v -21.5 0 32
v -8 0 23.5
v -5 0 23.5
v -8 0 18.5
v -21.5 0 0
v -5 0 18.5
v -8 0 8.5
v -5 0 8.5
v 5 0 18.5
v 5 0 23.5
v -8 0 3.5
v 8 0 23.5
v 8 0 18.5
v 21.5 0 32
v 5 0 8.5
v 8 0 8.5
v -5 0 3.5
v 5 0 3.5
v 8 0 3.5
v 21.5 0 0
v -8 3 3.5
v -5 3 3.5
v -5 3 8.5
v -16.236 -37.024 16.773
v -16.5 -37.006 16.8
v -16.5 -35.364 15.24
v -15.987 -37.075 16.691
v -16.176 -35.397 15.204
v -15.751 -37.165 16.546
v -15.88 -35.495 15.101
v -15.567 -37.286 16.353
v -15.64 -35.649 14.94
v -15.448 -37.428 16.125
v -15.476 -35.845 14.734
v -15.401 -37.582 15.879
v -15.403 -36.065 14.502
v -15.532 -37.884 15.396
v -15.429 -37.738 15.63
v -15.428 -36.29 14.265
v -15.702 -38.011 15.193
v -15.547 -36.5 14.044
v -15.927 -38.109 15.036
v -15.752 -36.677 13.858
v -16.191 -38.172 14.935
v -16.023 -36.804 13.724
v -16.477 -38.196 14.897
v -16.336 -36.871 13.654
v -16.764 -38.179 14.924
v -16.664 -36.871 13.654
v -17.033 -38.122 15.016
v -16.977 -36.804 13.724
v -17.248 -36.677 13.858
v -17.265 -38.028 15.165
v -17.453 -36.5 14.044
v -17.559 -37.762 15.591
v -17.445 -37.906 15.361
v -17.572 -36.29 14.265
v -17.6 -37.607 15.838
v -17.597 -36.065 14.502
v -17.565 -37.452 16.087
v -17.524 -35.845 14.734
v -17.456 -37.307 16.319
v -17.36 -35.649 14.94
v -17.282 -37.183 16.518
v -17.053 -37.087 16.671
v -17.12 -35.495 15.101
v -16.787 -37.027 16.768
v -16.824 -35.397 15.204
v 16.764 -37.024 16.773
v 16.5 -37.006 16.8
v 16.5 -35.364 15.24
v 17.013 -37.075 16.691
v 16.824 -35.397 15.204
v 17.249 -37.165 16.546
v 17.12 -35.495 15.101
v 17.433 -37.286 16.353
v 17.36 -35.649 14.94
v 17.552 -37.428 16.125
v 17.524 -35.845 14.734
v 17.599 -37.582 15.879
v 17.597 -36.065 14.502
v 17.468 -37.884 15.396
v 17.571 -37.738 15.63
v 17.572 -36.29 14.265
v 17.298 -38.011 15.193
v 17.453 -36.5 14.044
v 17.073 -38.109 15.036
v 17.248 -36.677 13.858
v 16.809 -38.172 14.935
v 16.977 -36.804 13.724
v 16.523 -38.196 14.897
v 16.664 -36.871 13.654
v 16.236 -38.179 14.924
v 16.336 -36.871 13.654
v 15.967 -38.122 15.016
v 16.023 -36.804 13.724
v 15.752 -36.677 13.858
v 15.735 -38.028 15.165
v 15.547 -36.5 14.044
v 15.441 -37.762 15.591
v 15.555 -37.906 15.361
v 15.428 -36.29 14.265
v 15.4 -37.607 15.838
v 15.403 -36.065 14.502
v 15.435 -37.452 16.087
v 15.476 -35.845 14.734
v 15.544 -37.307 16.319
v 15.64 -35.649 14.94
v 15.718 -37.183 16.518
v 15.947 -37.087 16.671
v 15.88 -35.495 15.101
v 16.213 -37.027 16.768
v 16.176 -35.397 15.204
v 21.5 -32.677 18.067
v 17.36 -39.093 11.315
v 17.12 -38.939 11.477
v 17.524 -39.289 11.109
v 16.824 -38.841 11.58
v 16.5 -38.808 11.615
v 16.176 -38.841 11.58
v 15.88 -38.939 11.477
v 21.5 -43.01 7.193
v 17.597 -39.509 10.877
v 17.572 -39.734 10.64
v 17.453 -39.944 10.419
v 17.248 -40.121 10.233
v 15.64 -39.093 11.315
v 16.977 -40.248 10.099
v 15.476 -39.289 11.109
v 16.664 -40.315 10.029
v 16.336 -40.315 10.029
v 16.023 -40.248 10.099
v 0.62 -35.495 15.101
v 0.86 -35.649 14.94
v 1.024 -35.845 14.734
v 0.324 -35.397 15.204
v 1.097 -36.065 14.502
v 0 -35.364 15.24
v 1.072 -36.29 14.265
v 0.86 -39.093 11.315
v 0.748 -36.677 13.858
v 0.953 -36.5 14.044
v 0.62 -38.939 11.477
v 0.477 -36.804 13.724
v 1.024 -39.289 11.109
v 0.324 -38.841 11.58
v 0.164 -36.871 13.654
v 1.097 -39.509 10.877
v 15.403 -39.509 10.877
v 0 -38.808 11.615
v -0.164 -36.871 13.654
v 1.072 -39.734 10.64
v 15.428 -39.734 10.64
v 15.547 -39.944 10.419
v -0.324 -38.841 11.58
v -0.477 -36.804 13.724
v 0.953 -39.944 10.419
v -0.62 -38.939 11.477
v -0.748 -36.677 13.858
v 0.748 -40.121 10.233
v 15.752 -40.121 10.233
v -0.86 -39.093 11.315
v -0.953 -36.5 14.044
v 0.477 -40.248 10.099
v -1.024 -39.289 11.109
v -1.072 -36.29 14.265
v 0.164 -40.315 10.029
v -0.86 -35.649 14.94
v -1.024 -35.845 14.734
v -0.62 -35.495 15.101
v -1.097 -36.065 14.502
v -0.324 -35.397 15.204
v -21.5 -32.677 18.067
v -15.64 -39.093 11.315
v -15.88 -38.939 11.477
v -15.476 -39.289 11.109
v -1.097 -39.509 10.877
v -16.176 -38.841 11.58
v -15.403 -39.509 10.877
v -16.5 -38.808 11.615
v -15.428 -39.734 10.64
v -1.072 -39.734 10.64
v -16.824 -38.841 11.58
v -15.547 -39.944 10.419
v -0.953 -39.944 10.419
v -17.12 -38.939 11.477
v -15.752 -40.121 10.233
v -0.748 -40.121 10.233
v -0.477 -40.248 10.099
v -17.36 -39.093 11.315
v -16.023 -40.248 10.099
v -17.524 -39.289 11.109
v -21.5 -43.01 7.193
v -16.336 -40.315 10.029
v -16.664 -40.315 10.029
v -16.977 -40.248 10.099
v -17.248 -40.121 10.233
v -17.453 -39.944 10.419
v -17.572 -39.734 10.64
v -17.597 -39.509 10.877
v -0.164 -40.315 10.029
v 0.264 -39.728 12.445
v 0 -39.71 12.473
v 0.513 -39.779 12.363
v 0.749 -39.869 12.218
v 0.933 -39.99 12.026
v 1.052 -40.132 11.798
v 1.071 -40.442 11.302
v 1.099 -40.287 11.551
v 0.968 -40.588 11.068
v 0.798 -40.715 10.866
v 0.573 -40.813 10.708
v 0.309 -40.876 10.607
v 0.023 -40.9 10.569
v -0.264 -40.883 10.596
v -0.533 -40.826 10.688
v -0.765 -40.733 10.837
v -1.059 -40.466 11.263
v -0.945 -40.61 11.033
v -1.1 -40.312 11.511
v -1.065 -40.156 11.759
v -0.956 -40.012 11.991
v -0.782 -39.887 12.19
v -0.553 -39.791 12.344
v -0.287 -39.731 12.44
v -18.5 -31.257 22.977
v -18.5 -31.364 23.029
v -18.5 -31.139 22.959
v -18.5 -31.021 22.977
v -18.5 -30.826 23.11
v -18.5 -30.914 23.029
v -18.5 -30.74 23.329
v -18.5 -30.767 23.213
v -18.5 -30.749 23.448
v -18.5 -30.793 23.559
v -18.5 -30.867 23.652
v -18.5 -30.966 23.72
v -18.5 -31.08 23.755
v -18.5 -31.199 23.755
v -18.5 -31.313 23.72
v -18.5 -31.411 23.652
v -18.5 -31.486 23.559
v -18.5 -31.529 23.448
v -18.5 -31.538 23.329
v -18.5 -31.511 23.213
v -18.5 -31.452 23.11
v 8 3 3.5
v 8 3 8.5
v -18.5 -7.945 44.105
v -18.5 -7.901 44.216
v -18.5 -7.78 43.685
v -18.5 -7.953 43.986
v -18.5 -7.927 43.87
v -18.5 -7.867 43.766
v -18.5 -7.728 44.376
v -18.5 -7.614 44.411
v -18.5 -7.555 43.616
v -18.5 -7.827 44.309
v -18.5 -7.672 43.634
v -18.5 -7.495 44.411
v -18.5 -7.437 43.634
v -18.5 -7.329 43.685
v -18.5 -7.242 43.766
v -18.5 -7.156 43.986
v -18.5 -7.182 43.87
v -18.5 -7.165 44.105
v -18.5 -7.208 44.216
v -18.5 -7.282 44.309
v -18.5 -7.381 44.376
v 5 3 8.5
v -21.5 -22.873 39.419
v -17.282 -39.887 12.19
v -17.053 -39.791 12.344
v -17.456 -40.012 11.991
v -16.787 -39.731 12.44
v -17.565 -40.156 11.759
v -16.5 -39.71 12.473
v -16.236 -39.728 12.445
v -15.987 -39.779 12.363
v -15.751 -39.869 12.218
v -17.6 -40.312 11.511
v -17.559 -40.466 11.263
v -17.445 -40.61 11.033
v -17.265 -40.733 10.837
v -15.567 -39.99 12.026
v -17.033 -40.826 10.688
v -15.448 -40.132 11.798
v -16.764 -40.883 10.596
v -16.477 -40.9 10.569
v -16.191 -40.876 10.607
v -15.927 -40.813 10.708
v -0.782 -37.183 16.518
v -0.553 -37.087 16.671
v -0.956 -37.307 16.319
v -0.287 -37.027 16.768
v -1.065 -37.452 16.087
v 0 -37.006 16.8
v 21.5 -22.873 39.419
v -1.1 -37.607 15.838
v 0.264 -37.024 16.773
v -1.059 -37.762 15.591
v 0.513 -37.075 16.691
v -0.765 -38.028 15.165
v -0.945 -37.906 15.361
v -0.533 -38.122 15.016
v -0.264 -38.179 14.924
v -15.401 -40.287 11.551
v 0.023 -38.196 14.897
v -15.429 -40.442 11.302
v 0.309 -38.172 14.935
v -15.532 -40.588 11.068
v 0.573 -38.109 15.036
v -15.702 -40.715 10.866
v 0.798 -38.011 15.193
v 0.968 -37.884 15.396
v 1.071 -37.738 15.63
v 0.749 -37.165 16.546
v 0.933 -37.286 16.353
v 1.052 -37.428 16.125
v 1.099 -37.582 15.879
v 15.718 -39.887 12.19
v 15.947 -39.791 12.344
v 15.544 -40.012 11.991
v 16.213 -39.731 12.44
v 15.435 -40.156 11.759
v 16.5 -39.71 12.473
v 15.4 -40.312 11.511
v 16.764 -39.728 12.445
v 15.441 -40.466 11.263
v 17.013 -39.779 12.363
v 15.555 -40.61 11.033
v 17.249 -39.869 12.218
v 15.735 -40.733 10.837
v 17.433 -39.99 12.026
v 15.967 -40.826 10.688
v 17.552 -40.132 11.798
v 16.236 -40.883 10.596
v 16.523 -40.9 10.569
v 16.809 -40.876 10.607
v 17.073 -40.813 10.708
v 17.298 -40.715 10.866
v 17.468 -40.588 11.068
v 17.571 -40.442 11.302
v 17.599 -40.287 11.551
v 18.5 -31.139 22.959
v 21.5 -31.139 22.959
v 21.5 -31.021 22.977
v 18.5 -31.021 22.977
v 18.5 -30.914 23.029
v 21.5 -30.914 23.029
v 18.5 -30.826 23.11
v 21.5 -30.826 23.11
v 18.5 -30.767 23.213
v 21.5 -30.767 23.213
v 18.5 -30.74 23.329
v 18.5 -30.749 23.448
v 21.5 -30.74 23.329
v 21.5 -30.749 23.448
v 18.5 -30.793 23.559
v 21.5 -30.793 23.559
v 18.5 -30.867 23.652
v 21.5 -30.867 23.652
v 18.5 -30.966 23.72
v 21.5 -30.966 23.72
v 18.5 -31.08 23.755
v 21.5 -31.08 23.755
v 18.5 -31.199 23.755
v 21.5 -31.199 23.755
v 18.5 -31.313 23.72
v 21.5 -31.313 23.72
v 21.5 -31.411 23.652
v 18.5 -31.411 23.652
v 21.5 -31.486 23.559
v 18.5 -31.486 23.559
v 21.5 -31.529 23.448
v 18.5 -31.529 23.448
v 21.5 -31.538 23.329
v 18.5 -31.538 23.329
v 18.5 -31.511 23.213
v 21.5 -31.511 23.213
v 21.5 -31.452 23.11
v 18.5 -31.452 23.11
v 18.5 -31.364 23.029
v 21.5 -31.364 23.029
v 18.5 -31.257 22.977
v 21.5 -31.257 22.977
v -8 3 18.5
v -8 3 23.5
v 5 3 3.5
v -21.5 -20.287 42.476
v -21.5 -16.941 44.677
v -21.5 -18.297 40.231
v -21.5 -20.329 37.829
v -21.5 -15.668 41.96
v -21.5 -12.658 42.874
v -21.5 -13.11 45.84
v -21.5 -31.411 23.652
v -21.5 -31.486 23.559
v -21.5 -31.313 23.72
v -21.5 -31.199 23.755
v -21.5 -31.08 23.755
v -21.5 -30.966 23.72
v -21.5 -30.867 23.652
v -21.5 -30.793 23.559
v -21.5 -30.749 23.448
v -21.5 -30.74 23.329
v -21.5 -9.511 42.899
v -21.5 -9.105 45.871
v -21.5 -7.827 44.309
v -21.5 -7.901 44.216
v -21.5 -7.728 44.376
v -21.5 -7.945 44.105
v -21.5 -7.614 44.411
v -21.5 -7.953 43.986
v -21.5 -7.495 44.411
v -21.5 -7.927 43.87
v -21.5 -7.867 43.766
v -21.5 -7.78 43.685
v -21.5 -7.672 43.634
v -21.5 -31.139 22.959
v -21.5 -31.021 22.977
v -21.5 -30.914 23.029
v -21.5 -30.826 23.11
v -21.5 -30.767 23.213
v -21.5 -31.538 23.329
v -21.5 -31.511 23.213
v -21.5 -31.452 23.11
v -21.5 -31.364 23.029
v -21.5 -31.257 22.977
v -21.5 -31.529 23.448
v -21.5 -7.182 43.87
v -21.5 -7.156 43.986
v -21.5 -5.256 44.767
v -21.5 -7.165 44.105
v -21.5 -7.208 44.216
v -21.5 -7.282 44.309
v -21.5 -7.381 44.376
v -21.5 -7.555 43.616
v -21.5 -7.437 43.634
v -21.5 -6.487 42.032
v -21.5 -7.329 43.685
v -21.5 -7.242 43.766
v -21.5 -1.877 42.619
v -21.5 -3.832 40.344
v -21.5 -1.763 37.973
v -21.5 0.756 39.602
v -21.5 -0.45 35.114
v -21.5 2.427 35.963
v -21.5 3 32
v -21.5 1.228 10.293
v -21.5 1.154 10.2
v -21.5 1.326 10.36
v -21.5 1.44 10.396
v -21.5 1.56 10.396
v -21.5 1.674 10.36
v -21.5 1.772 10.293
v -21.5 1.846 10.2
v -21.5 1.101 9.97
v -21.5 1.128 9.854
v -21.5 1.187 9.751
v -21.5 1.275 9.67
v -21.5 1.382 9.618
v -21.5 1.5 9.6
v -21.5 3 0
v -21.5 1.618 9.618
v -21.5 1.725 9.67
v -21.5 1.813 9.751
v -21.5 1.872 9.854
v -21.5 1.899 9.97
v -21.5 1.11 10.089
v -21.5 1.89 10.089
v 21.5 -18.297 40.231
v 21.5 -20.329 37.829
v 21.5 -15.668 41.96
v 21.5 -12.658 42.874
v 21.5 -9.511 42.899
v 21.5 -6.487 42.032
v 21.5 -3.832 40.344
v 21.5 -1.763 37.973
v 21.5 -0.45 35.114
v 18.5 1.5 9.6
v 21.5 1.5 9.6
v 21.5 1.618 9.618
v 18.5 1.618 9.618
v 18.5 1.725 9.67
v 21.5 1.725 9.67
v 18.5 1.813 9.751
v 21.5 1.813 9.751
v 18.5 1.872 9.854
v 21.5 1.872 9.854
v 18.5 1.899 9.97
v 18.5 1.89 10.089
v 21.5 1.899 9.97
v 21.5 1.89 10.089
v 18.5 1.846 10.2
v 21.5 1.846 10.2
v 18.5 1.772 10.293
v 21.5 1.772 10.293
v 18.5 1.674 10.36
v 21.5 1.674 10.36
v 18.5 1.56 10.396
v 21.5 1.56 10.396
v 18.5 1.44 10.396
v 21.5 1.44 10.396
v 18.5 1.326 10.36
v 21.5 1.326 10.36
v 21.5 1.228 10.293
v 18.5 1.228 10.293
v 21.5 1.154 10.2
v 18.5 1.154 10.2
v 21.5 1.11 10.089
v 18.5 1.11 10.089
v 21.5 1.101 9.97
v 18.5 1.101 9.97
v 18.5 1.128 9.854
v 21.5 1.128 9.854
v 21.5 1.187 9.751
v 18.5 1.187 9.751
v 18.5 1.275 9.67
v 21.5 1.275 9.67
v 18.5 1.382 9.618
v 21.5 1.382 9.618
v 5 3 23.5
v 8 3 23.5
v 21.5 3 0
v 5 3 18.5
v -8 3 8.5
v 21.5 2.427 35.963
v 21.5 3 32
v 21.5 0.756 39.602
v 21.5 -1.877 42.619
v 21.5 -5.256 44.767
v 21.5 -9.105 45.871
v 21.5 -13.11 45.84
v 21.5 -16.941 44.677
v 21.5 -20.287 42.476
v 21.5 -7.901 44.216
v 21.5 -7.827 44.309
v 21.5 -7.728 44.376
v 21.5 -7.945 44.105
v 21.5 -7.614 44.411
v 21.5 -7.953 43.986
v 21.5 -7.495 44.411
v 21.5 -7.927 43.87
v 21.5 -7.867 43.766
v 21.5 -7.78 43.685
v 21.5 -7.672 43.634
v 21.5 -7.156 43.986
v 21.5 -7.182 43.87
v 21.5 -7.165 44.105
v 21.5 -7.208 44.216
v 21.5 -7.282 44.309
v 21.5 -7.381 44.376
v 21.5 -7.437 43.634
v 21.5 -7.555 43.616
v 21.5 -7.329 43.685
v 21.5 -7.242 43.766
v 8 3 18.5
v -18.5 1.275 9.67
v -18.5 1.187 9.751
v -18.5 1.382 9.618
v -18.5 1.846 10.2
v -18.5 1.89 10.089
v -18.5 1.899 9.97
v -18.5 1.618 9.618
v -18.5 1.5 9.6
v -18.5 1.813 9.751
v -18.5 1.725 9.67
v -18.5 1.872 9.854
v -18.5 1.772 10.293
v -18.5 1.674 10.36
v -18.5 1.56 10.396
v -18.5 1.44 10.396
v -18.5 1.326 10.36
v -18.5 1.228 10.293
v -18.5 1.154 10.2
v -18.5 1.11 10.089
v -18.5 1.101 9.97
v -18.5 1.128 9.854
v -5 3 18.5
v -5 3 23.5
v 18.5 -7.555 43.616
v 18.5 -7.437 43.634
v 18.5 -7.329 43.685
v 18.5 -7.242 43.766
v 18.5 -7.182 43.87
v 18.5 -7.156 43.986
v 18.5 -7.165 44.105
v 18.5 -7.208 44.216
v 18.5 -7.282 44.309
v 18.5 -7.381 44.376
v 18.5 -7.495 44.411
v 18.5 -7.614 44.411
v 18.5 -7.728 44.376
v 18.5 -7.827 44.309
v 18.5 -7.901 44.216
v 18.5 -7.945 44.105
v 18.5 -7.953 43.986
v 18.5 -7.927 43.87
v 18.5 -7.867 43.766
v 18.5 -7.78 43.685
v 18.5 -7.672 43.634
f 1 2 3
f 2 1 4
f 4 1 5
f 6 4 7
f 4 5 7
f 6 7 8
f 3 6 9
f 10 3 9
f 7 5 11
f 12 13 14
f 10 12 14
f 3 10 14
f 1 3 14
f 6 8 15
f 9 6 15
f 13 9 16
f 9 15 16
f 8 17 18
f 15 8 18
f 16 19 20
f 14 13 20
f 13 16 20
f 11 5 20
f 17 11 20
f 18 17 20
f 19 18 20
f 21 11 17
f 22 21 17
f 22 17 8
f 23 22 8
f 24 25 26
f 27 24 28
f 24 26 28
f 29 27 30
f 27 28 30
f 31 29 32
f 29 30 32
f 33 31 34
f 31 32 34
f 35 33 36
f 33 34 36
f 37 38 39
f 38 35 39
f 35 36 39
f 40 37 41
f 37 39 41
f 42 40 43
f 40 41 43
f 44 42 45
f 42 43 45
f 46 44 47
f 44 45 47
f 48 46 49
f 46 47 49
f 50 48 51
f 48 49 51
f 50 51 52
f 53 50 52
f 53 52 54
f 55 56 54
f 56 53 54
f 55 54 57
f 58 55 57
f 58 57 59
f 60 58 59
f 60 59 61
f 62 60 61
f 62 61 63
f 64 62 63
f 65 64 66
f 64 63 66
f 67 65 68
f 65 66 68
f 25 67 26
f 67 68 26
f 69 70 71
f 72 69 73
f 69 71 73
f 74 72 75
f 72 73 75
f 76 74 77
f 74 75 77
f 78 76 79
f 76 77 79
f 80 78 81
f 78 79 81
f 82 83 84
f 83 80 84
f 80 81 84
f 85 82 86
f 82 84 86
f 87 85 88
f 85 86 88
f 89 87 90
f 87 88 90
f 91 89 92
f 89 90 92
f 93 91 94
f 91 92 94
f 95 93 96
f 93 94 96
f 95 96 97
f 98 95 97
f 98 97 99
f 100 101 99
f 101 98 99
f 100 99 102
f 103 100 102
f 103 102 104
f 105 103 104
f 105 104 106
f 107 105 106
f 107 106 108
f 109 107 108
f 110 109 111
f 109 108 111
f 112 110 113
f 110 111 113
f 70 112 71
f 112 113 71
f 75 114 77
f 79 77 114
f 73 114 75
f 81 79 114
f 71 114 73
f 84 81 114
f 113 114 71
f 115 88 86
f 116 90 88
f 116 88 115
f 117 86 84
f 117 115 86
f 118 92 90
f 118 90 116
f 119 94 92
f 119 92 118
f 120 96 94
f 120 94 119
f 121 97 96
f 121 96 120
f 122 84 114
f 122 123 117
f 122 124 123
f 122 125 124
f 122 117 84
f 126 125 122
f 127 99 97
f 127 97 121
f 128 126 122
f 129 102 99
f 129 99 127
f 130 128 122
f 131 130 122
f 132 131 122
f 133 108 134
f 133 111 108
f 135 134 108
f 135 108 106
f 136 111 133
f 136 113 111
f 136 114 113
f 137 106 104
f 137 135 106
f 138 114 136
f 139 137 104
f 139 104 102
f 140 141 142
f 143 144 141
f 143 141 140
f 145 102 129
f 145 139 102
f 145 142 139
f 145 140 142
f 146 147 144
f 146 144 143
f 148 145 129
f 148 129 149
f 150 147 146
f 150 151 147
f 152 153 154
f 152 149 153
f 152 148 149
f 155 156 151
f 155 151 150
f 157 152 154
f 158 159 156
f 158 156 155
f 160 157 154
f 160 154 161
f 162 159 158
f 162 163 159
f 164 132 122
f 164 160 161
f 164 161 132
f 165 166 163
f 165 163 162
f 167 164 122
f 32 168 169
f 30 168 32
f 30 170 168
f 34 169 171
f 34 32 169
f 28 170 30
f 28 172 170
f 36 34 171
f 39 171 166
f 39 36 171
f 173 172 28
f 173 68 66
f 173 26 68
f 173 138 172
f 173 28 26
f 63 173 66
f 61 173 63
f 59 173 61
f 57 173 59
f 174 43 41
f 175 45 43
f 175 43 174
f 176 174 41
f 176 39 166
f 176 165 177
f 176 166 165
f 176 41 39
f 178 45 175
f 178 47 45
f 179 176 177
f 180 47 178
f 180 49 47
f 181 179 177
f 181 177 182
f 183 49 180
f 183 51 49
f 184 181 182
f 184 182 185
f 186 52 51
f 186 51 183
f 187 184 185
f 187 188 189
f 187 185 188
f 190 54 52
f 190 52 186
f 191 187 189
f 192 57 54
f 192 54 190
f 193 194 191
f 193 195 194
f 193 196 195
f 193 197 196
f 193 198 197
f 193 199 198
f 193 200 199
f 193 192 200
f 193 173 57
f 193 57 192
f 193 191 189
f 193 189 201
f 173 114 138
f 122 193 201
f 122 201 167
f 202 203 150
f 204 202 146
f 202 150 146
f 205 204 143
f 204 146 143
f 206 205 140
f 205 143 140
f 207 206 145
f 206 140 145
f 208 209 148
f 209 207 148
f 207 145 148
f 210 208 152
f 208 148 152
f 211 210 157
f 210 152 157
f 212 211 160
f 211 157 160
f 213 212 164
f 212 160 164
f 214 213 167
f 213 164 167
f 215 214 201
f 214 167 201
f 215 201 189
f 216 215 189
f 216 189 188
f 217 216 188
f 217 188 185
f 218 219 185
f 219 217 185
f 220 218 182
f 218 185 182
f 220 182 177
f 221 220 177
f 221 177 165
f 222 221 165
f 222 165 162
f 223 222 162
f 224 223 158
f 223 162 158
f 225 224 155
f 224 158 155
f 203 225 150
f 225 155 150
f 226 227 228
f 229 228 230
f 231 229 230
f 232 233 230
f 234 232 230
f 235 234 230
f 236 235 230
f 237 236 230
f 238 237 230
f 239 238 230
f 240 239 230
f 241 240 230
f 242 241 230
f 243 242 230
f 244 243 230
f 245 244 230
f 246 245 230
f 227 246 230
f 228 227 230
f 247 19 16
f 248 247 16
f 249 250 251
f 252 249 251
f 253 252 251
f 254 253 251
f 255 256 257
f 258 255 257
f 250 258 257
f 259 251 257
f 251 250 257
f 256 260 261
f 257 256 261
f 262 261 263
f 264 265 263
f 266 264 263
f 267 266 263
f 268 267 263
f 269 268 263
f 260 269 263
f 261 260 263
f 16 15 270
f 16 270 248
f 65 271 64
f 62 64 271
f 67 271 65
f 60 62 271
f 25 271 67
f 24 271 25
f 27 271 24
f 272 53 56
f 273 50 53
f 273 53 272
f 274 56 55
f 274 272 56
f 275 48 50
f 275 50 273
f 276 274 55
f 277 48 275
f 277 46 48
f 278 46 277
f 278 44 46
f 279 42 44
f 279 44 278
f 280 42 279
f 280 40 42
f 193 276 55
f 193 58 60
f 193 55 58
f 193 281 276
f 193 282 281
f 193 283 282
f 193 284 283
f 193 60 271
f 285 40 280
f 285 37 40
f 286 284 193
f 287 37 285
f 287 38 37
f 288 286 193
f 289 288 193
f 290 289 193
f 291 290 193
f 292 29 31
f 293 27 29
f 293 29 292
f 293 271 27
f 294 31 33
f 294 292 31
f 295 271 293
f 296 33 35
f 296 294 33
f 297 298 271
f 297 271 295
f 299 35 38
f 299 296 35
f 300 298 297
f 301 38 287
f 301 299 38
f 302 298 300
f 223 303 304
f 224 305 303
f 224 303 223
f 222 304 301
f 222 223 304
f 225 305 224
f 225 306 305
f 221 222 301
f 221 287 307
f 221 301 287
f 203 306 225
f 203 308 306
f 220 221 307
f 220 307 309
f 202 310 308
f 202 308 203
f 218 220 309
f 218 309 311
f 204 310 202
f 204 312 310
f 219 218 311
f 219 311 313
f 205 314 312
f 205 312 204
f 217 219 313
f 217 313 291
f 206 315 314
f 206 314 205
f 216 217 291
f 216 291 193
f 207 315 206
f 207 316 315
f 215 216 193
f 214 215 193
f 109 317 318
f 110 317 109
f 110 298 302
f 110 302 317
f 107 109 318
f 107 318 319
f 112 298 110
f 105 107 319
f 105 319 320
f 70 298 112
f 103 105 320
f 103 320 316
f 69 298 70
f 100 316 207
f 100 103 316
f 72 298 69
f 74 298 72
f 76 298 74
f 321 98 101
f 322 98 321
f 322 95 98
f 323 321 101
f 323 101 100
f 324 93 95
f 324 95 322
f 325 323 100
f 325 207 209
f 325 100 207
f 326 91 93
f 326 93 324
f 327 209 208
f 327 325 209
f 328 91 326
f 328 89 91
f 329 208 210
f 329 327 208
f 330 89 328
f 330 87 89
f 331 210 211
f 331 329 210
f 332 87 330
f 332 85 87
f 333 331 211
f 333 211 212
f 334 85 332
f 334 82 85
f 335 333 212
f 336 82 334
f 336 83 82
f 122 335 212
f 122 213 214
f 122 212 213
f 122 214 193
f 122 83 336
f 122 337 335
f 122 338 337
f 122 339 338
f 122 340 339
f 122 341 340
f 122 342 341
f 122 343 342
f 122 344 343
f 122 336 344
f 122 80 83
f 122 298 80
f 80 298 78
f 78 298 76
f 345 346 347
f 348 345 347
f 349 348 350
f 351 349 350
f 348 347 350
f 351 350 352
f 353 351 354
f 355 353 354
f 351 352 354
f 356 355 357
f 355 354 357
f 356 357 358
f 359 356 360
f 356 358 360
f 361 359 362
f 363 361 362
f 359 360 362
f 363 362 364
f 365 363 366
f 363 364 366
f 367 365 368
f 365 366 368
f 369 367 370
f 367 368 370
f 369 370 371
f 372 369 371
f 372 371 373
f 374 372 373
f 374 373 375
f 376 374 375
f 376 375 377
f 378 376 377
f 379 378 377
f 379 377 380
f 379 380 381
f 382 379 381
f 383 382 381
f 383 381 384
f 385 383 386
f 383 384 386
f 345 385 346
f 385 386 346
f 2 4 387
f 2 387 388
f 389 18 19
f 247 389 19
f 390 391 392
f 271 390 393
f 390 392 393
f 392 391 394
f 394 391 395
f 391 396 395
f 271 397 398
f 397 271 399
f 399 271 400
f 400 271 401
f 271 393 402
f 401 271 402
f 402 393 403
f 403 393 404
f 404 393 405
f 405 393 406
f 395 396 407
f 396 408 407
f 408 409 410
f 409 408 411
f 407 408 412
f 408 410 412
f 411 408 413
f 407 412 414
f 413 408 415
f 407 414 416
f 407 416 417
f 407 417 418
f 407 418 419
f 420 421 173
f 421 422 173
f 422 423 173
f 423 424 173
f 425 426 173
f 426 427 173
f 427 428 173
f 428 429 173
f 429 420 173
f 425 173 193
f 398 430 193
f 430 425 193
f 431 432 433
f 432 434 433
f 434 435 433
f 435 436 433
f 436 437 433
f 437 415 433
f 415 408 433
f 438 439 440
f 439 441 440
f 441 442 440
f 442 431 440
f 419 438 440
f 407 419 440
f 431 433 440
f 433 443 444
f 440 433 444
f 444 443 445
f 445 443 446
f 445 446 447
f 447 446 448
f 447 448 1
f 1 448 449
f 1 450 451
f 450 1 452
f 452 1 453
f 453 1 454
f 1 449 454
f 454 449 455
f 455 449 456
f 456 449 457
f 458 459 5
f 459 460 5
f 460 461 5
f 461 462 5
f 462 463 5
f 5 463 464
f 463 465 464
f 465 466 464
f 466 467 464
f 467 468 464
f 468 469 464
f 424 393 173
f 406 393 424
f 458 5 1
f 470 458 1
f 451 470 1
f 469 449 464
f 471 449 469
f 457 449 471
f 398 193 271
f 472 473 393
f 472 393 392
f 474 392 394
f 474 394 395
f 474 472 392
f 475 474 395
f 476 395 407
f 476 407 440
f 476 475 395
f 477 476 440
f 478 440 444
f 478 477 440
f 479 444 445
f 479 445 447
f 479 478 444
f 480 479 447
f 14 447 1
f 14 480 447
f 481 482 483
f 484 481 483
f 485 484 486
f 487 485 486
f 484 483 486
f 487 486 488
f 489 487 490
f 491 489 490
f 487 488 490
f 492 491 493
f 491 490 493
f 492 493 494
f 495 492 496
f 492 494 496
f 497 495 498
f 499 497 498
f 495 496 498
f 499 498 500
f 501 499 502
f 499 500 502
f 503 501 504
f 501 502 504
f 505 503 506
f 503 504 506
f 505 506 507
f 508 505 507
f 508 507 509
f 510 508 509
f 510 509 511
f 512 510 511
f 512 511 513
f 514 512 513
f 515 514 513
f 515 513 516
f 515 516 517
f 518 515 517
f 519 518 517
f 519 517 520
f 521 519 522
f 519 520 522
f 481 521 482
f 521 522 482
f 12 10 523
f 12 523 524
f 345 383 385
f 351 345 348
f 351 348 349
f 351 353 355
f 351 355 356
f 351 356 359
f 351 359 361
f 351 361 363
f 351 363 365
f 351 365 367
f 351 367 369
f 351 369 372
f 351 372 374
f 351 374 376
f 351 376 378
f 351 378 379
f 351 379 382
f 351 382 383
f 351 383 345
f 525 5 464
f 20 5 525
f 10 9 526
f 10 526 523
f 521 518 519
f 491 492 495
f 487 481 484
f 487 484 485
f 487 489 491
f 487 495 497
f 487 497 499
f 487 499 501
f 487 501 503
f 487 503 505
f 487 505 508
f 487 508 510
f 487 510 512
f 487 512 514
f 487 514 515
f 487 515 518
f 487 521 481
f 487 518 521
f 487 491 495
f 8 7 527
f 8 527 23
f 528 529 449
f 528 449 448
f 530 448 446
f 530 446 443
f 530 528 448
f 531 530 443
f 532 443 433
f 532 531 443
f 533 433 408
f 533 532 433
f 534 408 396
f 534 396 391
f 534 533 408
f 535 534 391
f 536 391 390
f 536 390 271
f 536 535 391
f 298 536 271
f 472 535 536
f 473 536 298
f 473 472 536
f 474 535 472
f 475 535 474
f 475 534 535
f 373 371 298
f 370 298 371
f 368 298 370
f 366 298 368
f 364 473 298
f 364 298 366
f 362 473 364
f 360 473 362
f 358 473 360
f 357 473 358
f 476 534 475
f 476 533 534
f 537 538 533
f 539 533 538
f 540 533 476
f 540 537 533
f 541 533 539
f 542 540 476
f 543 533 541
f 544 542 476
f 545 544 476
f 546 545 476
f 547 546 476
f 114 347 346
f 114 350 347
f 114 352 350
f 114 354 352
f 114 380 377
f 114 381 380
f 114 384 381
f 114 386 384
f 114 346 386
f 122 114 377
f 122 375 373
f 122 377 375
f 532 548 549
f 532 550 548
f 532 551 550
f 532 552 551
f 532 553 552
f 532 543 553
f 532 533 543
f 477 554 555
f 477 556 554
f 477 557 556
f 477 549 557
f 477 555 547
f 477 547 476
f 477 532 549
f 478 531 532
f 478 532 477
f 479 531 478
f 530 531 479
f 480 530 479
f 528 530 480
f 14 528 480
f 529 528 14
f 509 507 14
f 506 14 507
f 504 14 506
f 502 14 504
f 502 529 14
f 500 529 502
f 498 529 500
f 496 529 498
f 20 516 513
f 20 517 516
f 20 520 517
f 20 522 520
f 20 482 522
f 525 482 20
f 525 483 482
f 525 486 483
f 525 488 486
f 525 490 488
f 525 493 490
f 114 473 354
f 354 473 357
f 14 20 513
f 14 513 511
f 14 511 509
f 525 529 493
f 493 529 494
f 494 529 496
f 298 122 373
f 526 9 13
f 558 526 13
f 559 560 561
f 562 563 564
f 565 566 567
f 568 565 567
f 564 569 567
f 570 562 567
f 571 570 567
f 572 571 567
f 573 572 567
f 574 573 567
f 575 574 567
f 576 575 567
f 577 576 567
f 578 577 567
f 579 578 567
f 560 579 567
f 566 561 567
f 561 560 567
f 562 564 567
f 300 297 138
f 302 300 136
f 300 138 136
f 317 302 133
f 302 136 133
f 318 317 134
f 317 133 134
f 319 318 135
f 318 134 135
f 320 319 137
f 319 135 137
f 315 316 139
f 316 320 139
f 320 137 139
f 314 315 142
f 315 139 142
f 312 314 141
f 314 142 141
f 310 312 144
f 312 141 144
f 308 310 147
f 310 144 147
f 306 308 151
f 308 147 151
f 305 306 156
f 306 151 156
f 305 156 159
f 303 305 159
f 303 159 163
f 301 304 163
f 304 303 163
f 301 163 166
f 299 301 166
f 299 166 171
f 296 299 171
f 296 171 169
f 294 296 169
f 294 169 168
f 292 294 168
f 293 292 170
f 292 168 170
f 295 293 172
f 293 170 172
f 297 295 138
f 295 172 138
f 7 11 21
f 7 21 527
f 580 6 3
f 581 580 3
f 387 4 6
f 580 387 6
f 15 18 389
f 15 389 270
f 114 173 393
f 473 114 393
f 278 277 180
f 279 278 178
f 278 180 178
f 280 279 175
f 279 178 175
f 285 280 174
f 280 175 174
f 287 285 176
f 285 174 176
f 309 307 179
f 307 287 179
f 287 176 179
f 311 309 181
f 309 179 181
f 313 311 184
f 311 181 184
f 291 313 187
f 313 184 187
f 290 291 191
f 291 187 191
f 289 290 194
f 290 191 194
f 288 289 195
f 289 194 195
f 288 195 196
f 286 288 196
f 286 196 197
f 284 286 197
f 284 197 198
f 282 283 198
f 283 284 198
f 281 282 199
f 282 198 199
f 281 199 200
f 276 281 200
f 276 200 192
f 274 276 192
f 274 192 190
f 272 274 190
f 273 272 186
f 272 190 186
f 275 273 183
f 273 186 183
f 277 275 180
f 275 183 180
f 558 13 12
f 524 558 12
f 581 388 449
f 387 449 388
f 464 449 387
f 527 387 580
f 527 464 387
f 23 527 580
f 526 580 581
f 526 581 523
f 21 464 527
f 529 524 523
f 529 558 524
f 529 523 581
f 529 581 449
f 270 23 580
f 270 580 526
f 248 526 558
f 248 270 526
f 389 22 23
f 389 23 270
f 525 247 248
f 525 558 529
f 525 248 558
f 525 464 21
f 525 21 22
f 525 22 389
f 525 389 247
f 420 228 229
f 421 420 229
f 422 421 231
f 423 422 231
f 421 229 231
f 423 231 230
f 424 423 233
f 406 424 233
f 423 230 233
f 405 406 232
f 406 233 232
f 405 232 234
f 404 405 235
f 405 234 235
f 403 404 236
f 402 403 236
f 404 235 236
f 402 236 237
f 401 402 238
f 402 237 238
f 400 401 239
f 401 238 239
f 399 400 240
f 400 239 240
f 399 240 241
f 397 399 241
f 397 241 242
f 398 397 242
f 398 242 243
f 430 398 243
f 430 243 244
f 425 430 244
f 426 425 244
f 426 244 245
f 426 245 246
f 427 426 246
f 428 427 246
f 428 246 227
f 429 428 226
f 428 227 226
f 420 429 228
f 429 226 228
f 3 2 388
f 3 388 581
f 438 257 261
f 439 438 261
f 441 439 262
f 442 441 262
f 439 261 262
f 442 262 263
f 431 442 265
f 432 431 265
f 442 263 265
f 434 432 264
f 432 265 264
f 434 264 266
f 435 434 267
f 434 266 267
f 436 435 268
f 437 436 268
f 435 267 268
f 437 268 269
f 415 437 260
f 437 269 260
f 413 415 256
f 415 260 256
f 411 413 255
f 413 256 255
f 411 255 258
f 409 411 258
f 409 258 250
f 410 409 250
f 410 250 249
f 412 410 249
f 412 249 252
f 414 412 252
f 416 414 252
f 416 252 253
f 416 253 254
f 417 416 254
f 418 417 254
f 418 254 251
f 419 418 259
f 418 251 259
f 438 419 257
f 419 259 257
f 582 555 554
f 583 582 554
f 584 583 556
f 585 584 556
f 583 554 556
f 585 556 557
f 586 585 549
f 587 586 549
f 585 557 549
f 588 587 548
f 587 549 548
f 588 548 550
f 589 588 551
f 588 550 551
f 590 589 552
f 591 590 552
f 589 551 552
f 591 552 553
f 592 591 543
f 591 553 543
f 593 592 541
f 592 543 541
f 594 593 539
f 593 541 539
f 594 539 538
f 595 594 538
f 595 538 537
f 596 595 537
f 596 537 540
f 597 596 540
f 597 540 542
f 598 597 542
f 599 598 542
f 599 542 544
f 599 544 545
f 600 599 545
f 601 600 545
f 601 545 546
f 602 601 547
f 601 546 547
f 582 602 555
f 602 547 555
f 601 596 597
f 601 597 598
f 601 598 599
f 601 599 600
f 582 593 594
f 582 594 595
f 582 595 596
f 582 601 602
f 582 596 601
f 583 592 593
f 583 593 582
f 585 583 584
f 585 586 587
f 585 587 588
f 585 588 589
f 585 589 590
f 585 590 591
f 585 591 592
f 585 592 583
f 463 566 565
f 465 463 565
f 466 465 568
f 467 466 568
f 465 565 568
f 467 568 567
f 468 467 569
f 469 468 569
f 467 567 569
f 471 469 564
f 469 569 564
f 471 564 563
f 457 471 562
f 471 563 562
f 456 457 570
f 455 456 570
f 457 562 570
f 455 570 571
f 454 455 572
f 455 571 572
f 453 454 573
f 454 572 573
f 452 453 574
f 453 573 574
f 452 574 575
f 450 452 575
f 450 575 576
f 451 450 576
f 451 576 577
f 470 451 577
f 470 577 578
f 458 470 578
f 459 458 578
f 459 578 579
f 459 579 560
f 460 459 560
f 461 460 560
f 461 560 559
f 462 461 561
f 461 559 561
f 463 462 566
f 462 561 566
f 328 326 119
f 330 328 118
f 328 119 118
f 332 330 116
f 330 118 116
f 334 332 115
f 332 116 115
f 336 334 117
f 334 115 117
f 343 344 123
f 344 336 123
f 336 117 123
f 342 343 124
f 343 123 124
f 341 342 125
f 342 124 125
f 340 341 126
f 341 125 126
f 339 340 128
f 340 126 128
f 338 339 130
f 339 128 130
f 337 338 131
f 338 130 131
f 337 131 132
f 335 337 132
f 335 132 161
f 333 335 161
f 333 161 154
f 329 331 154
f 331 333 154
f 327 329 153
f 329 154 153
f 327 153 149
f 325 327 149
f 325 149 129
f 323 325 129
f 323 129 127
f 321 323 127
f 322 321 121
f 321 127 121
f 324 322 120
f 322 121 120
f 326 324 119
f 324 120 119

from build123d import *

# Parameters (mm, degrees)
SKETCH_2_W               = 43
SKETCH_2_H               = 32
EXTRUDE_1_DEPTH          = 3
EXTRUDE_2_DEPTH          = 43
SKETCH_4_W               = 3
SKETCH_4_H               = 5
CUT_EXTRUDE_1_DEPTH      = 67.543791262
SKETCH_5_R               = 0.4
CUT_EXTRUDE_2_DEPTH      = 3
CUT_EXTRUDE_START        = -40
SKETCH_5_3_R             = 0.4
CUT_EXTRUDE_3_DEPTH      = 3
CUT_EXTRUDE_4_DEPTH      = 77.255007413
CUT_EXTRUDE_4_DEPTH_BACK = 77.255007413
SKETCH_8_R               = 1.1
CUT_EXTRUDE_5_DEPTH      = 44.977948296


with BuildPart() as part:
    # 草图2 → 凸台-拉伸1 (new body)
    with BuildSketch(Plane(origin=(0, 0, 0), x_dir=(1, 0, 0), z_dir=(0, 1, 0))):
        with Locations((0, -16)):
            Rectangle(SKETCH_2_W, SKETCH_2_H)
    extrude(amount=EXTRUDE_1_DEPTH)

    # 草图3 → 凸台-拉伸2 (add)
    with BuildSketch(Plane(origin=(21.5, 0, 0), x_dir=(0, 0, -1), z_dir=(1, 0, 0))):
        with BuildLine():
            ThreePointArc((-37.829111907, -20.328529058), (-42.573878655, -7.967989086), (-32, 0))
            Line((-32, 0), (-23.339745962, 0))
            ThreePointArc((-23.339745962, 0), (-43.453167914, -2.948606038), (-39.418869699, -22.872673346))
            Line((-39.418869699, -22.872673346), (-7.193042045, -43.009605387))
            Line((-7.193042045, -43.009605387), (-5.603284253, -40.465461099))
            Line((-5.603284253, -40.465461099), (-37.829111907, -20.328529058))
        make_face()
    extrude(amount=-EXTRUDE_2_DEPTH)

    # 草图4 → 切除-拉伸1 (cut, through all)
    with BuildSketch(Plane.XZ):
        with Locations((6.5, 6)):
            Rectangle(SKETCH_4_W, SKETCH_4_H)
        with Locations((6.5, 21)):
            Rectangle(SKETCH_4_W, SKETCH_4_H)
        with Locations((-6.5, 6)):
            Rectangle(SKETCH_4_W, SKETCH_4_H)
        with Locations((-6.5, 21)):
            Rectangle(SKETCH_4_W, SKETCH_4_H)
    extrude(amount=-CUT_EXTRUDE_1_DEPTH, mode=Mode.SUBTRACT)

    # 草图5 → 切除-拉伸2 (cut)
    with BuildSketch(Plane(origin=(21.5, 0, 0), x_dir=(0, 0, -1), z_dir=(1, 0, 0))):
        with Locations((-10, 1.5)):
            Circle(SKETCH_5_R)
        with Locations((-44.015771199, -7.554533052)):
            Circle(SKETCH_5_R)
        with Locations((-23.359125072, -31.139147958)):
            Circle(SKETCH_5_R)
    extrude(amount=-CUT_EXTRUDE_2_DEPTH, mode=Mode.SUBTRACT)

    # 草图5<3> → 切除-拉伸3 (cut)
    with BuildSketch(Plane(origin=(21.5, 0, 0), x_dir=(0, 0, -1), z_dir=(1, 0, 0)).offset(CUT_EXTRUDE_START)):
        with Locations((-10, 1.5)):
            Circle(SKETCH_5_3_R)
        with Locations((-44.015771199, -7.554533052)):
            Circle(SKETCH_5_3_R)
        with Locations((-23.359125072, -31.139147958)):
            Circle(SKETCH_5_3_R)
    extrude(amount=-CUT_EXTRUDE_3_DEPTH, mode=Mode.SUBTRACT)

    # 草图6 → 切除-拉伸4 (cut, two sides: drawn at the far end of the back side and taken through both)
    with BuildSketch(Plane(origin=(21.5, 0, 0), x_dir=(0, 0, -1), z_dir=(1, 0, 0)).offset(-CUT_EXTRUDE_4_DEPTH_BACK)):
        Polygon((-18.06699493, -32.677270285), (-7.193042045, -43.009605387), (-5.603284253, -40.465461099), align=None)
    extrude(amount=CUT_EXTRUDE_4_DEPTH + CUT_EXTRUDE_4_DEPTH_BACK, mode=Mode.SUBTRACT)

    # 草图8 → 切除-拉伸5 (cut, through all)
    with BuildSketch(Plane(origin=(0, -26.194402521, 24.8896926), x_dir=(1, 0, 0), z_dir=(0, 0.7249301923221455, -0.6888223401282635))):
        with Locations(Location((16.5, 19.411523677, 0), (0, 0, 270))):
            Circle(SKETCH_8_R)
        with Locations(Location((16.5, 14.411523677, 0), (0, 0, 270))):
            Circle(SKETCH_8_R)
        with Locations(Location((0, 14.411523677, 0), (0, 0, 270))):
            Circle(SKETCH_8_R)
        with Locations(Location((0, 19.411523677, 0), (0, 0, 270))):
            Circle(SKETCH_8_R)
        with Locations(Location((-16.5, 19.411523677, 0), (0, 0, 270))):
            Circle(SKETCH_8_R)
        with Locations(Location((-16.5, 14.411523677, 0), (0, 0, 270))):
            Circle(SKETCH_8_R)
    extrude(amount=-CUT_EXTRUDE_5_DEPTH, mode=Mode.SUBTRACT)


solid = part.part
